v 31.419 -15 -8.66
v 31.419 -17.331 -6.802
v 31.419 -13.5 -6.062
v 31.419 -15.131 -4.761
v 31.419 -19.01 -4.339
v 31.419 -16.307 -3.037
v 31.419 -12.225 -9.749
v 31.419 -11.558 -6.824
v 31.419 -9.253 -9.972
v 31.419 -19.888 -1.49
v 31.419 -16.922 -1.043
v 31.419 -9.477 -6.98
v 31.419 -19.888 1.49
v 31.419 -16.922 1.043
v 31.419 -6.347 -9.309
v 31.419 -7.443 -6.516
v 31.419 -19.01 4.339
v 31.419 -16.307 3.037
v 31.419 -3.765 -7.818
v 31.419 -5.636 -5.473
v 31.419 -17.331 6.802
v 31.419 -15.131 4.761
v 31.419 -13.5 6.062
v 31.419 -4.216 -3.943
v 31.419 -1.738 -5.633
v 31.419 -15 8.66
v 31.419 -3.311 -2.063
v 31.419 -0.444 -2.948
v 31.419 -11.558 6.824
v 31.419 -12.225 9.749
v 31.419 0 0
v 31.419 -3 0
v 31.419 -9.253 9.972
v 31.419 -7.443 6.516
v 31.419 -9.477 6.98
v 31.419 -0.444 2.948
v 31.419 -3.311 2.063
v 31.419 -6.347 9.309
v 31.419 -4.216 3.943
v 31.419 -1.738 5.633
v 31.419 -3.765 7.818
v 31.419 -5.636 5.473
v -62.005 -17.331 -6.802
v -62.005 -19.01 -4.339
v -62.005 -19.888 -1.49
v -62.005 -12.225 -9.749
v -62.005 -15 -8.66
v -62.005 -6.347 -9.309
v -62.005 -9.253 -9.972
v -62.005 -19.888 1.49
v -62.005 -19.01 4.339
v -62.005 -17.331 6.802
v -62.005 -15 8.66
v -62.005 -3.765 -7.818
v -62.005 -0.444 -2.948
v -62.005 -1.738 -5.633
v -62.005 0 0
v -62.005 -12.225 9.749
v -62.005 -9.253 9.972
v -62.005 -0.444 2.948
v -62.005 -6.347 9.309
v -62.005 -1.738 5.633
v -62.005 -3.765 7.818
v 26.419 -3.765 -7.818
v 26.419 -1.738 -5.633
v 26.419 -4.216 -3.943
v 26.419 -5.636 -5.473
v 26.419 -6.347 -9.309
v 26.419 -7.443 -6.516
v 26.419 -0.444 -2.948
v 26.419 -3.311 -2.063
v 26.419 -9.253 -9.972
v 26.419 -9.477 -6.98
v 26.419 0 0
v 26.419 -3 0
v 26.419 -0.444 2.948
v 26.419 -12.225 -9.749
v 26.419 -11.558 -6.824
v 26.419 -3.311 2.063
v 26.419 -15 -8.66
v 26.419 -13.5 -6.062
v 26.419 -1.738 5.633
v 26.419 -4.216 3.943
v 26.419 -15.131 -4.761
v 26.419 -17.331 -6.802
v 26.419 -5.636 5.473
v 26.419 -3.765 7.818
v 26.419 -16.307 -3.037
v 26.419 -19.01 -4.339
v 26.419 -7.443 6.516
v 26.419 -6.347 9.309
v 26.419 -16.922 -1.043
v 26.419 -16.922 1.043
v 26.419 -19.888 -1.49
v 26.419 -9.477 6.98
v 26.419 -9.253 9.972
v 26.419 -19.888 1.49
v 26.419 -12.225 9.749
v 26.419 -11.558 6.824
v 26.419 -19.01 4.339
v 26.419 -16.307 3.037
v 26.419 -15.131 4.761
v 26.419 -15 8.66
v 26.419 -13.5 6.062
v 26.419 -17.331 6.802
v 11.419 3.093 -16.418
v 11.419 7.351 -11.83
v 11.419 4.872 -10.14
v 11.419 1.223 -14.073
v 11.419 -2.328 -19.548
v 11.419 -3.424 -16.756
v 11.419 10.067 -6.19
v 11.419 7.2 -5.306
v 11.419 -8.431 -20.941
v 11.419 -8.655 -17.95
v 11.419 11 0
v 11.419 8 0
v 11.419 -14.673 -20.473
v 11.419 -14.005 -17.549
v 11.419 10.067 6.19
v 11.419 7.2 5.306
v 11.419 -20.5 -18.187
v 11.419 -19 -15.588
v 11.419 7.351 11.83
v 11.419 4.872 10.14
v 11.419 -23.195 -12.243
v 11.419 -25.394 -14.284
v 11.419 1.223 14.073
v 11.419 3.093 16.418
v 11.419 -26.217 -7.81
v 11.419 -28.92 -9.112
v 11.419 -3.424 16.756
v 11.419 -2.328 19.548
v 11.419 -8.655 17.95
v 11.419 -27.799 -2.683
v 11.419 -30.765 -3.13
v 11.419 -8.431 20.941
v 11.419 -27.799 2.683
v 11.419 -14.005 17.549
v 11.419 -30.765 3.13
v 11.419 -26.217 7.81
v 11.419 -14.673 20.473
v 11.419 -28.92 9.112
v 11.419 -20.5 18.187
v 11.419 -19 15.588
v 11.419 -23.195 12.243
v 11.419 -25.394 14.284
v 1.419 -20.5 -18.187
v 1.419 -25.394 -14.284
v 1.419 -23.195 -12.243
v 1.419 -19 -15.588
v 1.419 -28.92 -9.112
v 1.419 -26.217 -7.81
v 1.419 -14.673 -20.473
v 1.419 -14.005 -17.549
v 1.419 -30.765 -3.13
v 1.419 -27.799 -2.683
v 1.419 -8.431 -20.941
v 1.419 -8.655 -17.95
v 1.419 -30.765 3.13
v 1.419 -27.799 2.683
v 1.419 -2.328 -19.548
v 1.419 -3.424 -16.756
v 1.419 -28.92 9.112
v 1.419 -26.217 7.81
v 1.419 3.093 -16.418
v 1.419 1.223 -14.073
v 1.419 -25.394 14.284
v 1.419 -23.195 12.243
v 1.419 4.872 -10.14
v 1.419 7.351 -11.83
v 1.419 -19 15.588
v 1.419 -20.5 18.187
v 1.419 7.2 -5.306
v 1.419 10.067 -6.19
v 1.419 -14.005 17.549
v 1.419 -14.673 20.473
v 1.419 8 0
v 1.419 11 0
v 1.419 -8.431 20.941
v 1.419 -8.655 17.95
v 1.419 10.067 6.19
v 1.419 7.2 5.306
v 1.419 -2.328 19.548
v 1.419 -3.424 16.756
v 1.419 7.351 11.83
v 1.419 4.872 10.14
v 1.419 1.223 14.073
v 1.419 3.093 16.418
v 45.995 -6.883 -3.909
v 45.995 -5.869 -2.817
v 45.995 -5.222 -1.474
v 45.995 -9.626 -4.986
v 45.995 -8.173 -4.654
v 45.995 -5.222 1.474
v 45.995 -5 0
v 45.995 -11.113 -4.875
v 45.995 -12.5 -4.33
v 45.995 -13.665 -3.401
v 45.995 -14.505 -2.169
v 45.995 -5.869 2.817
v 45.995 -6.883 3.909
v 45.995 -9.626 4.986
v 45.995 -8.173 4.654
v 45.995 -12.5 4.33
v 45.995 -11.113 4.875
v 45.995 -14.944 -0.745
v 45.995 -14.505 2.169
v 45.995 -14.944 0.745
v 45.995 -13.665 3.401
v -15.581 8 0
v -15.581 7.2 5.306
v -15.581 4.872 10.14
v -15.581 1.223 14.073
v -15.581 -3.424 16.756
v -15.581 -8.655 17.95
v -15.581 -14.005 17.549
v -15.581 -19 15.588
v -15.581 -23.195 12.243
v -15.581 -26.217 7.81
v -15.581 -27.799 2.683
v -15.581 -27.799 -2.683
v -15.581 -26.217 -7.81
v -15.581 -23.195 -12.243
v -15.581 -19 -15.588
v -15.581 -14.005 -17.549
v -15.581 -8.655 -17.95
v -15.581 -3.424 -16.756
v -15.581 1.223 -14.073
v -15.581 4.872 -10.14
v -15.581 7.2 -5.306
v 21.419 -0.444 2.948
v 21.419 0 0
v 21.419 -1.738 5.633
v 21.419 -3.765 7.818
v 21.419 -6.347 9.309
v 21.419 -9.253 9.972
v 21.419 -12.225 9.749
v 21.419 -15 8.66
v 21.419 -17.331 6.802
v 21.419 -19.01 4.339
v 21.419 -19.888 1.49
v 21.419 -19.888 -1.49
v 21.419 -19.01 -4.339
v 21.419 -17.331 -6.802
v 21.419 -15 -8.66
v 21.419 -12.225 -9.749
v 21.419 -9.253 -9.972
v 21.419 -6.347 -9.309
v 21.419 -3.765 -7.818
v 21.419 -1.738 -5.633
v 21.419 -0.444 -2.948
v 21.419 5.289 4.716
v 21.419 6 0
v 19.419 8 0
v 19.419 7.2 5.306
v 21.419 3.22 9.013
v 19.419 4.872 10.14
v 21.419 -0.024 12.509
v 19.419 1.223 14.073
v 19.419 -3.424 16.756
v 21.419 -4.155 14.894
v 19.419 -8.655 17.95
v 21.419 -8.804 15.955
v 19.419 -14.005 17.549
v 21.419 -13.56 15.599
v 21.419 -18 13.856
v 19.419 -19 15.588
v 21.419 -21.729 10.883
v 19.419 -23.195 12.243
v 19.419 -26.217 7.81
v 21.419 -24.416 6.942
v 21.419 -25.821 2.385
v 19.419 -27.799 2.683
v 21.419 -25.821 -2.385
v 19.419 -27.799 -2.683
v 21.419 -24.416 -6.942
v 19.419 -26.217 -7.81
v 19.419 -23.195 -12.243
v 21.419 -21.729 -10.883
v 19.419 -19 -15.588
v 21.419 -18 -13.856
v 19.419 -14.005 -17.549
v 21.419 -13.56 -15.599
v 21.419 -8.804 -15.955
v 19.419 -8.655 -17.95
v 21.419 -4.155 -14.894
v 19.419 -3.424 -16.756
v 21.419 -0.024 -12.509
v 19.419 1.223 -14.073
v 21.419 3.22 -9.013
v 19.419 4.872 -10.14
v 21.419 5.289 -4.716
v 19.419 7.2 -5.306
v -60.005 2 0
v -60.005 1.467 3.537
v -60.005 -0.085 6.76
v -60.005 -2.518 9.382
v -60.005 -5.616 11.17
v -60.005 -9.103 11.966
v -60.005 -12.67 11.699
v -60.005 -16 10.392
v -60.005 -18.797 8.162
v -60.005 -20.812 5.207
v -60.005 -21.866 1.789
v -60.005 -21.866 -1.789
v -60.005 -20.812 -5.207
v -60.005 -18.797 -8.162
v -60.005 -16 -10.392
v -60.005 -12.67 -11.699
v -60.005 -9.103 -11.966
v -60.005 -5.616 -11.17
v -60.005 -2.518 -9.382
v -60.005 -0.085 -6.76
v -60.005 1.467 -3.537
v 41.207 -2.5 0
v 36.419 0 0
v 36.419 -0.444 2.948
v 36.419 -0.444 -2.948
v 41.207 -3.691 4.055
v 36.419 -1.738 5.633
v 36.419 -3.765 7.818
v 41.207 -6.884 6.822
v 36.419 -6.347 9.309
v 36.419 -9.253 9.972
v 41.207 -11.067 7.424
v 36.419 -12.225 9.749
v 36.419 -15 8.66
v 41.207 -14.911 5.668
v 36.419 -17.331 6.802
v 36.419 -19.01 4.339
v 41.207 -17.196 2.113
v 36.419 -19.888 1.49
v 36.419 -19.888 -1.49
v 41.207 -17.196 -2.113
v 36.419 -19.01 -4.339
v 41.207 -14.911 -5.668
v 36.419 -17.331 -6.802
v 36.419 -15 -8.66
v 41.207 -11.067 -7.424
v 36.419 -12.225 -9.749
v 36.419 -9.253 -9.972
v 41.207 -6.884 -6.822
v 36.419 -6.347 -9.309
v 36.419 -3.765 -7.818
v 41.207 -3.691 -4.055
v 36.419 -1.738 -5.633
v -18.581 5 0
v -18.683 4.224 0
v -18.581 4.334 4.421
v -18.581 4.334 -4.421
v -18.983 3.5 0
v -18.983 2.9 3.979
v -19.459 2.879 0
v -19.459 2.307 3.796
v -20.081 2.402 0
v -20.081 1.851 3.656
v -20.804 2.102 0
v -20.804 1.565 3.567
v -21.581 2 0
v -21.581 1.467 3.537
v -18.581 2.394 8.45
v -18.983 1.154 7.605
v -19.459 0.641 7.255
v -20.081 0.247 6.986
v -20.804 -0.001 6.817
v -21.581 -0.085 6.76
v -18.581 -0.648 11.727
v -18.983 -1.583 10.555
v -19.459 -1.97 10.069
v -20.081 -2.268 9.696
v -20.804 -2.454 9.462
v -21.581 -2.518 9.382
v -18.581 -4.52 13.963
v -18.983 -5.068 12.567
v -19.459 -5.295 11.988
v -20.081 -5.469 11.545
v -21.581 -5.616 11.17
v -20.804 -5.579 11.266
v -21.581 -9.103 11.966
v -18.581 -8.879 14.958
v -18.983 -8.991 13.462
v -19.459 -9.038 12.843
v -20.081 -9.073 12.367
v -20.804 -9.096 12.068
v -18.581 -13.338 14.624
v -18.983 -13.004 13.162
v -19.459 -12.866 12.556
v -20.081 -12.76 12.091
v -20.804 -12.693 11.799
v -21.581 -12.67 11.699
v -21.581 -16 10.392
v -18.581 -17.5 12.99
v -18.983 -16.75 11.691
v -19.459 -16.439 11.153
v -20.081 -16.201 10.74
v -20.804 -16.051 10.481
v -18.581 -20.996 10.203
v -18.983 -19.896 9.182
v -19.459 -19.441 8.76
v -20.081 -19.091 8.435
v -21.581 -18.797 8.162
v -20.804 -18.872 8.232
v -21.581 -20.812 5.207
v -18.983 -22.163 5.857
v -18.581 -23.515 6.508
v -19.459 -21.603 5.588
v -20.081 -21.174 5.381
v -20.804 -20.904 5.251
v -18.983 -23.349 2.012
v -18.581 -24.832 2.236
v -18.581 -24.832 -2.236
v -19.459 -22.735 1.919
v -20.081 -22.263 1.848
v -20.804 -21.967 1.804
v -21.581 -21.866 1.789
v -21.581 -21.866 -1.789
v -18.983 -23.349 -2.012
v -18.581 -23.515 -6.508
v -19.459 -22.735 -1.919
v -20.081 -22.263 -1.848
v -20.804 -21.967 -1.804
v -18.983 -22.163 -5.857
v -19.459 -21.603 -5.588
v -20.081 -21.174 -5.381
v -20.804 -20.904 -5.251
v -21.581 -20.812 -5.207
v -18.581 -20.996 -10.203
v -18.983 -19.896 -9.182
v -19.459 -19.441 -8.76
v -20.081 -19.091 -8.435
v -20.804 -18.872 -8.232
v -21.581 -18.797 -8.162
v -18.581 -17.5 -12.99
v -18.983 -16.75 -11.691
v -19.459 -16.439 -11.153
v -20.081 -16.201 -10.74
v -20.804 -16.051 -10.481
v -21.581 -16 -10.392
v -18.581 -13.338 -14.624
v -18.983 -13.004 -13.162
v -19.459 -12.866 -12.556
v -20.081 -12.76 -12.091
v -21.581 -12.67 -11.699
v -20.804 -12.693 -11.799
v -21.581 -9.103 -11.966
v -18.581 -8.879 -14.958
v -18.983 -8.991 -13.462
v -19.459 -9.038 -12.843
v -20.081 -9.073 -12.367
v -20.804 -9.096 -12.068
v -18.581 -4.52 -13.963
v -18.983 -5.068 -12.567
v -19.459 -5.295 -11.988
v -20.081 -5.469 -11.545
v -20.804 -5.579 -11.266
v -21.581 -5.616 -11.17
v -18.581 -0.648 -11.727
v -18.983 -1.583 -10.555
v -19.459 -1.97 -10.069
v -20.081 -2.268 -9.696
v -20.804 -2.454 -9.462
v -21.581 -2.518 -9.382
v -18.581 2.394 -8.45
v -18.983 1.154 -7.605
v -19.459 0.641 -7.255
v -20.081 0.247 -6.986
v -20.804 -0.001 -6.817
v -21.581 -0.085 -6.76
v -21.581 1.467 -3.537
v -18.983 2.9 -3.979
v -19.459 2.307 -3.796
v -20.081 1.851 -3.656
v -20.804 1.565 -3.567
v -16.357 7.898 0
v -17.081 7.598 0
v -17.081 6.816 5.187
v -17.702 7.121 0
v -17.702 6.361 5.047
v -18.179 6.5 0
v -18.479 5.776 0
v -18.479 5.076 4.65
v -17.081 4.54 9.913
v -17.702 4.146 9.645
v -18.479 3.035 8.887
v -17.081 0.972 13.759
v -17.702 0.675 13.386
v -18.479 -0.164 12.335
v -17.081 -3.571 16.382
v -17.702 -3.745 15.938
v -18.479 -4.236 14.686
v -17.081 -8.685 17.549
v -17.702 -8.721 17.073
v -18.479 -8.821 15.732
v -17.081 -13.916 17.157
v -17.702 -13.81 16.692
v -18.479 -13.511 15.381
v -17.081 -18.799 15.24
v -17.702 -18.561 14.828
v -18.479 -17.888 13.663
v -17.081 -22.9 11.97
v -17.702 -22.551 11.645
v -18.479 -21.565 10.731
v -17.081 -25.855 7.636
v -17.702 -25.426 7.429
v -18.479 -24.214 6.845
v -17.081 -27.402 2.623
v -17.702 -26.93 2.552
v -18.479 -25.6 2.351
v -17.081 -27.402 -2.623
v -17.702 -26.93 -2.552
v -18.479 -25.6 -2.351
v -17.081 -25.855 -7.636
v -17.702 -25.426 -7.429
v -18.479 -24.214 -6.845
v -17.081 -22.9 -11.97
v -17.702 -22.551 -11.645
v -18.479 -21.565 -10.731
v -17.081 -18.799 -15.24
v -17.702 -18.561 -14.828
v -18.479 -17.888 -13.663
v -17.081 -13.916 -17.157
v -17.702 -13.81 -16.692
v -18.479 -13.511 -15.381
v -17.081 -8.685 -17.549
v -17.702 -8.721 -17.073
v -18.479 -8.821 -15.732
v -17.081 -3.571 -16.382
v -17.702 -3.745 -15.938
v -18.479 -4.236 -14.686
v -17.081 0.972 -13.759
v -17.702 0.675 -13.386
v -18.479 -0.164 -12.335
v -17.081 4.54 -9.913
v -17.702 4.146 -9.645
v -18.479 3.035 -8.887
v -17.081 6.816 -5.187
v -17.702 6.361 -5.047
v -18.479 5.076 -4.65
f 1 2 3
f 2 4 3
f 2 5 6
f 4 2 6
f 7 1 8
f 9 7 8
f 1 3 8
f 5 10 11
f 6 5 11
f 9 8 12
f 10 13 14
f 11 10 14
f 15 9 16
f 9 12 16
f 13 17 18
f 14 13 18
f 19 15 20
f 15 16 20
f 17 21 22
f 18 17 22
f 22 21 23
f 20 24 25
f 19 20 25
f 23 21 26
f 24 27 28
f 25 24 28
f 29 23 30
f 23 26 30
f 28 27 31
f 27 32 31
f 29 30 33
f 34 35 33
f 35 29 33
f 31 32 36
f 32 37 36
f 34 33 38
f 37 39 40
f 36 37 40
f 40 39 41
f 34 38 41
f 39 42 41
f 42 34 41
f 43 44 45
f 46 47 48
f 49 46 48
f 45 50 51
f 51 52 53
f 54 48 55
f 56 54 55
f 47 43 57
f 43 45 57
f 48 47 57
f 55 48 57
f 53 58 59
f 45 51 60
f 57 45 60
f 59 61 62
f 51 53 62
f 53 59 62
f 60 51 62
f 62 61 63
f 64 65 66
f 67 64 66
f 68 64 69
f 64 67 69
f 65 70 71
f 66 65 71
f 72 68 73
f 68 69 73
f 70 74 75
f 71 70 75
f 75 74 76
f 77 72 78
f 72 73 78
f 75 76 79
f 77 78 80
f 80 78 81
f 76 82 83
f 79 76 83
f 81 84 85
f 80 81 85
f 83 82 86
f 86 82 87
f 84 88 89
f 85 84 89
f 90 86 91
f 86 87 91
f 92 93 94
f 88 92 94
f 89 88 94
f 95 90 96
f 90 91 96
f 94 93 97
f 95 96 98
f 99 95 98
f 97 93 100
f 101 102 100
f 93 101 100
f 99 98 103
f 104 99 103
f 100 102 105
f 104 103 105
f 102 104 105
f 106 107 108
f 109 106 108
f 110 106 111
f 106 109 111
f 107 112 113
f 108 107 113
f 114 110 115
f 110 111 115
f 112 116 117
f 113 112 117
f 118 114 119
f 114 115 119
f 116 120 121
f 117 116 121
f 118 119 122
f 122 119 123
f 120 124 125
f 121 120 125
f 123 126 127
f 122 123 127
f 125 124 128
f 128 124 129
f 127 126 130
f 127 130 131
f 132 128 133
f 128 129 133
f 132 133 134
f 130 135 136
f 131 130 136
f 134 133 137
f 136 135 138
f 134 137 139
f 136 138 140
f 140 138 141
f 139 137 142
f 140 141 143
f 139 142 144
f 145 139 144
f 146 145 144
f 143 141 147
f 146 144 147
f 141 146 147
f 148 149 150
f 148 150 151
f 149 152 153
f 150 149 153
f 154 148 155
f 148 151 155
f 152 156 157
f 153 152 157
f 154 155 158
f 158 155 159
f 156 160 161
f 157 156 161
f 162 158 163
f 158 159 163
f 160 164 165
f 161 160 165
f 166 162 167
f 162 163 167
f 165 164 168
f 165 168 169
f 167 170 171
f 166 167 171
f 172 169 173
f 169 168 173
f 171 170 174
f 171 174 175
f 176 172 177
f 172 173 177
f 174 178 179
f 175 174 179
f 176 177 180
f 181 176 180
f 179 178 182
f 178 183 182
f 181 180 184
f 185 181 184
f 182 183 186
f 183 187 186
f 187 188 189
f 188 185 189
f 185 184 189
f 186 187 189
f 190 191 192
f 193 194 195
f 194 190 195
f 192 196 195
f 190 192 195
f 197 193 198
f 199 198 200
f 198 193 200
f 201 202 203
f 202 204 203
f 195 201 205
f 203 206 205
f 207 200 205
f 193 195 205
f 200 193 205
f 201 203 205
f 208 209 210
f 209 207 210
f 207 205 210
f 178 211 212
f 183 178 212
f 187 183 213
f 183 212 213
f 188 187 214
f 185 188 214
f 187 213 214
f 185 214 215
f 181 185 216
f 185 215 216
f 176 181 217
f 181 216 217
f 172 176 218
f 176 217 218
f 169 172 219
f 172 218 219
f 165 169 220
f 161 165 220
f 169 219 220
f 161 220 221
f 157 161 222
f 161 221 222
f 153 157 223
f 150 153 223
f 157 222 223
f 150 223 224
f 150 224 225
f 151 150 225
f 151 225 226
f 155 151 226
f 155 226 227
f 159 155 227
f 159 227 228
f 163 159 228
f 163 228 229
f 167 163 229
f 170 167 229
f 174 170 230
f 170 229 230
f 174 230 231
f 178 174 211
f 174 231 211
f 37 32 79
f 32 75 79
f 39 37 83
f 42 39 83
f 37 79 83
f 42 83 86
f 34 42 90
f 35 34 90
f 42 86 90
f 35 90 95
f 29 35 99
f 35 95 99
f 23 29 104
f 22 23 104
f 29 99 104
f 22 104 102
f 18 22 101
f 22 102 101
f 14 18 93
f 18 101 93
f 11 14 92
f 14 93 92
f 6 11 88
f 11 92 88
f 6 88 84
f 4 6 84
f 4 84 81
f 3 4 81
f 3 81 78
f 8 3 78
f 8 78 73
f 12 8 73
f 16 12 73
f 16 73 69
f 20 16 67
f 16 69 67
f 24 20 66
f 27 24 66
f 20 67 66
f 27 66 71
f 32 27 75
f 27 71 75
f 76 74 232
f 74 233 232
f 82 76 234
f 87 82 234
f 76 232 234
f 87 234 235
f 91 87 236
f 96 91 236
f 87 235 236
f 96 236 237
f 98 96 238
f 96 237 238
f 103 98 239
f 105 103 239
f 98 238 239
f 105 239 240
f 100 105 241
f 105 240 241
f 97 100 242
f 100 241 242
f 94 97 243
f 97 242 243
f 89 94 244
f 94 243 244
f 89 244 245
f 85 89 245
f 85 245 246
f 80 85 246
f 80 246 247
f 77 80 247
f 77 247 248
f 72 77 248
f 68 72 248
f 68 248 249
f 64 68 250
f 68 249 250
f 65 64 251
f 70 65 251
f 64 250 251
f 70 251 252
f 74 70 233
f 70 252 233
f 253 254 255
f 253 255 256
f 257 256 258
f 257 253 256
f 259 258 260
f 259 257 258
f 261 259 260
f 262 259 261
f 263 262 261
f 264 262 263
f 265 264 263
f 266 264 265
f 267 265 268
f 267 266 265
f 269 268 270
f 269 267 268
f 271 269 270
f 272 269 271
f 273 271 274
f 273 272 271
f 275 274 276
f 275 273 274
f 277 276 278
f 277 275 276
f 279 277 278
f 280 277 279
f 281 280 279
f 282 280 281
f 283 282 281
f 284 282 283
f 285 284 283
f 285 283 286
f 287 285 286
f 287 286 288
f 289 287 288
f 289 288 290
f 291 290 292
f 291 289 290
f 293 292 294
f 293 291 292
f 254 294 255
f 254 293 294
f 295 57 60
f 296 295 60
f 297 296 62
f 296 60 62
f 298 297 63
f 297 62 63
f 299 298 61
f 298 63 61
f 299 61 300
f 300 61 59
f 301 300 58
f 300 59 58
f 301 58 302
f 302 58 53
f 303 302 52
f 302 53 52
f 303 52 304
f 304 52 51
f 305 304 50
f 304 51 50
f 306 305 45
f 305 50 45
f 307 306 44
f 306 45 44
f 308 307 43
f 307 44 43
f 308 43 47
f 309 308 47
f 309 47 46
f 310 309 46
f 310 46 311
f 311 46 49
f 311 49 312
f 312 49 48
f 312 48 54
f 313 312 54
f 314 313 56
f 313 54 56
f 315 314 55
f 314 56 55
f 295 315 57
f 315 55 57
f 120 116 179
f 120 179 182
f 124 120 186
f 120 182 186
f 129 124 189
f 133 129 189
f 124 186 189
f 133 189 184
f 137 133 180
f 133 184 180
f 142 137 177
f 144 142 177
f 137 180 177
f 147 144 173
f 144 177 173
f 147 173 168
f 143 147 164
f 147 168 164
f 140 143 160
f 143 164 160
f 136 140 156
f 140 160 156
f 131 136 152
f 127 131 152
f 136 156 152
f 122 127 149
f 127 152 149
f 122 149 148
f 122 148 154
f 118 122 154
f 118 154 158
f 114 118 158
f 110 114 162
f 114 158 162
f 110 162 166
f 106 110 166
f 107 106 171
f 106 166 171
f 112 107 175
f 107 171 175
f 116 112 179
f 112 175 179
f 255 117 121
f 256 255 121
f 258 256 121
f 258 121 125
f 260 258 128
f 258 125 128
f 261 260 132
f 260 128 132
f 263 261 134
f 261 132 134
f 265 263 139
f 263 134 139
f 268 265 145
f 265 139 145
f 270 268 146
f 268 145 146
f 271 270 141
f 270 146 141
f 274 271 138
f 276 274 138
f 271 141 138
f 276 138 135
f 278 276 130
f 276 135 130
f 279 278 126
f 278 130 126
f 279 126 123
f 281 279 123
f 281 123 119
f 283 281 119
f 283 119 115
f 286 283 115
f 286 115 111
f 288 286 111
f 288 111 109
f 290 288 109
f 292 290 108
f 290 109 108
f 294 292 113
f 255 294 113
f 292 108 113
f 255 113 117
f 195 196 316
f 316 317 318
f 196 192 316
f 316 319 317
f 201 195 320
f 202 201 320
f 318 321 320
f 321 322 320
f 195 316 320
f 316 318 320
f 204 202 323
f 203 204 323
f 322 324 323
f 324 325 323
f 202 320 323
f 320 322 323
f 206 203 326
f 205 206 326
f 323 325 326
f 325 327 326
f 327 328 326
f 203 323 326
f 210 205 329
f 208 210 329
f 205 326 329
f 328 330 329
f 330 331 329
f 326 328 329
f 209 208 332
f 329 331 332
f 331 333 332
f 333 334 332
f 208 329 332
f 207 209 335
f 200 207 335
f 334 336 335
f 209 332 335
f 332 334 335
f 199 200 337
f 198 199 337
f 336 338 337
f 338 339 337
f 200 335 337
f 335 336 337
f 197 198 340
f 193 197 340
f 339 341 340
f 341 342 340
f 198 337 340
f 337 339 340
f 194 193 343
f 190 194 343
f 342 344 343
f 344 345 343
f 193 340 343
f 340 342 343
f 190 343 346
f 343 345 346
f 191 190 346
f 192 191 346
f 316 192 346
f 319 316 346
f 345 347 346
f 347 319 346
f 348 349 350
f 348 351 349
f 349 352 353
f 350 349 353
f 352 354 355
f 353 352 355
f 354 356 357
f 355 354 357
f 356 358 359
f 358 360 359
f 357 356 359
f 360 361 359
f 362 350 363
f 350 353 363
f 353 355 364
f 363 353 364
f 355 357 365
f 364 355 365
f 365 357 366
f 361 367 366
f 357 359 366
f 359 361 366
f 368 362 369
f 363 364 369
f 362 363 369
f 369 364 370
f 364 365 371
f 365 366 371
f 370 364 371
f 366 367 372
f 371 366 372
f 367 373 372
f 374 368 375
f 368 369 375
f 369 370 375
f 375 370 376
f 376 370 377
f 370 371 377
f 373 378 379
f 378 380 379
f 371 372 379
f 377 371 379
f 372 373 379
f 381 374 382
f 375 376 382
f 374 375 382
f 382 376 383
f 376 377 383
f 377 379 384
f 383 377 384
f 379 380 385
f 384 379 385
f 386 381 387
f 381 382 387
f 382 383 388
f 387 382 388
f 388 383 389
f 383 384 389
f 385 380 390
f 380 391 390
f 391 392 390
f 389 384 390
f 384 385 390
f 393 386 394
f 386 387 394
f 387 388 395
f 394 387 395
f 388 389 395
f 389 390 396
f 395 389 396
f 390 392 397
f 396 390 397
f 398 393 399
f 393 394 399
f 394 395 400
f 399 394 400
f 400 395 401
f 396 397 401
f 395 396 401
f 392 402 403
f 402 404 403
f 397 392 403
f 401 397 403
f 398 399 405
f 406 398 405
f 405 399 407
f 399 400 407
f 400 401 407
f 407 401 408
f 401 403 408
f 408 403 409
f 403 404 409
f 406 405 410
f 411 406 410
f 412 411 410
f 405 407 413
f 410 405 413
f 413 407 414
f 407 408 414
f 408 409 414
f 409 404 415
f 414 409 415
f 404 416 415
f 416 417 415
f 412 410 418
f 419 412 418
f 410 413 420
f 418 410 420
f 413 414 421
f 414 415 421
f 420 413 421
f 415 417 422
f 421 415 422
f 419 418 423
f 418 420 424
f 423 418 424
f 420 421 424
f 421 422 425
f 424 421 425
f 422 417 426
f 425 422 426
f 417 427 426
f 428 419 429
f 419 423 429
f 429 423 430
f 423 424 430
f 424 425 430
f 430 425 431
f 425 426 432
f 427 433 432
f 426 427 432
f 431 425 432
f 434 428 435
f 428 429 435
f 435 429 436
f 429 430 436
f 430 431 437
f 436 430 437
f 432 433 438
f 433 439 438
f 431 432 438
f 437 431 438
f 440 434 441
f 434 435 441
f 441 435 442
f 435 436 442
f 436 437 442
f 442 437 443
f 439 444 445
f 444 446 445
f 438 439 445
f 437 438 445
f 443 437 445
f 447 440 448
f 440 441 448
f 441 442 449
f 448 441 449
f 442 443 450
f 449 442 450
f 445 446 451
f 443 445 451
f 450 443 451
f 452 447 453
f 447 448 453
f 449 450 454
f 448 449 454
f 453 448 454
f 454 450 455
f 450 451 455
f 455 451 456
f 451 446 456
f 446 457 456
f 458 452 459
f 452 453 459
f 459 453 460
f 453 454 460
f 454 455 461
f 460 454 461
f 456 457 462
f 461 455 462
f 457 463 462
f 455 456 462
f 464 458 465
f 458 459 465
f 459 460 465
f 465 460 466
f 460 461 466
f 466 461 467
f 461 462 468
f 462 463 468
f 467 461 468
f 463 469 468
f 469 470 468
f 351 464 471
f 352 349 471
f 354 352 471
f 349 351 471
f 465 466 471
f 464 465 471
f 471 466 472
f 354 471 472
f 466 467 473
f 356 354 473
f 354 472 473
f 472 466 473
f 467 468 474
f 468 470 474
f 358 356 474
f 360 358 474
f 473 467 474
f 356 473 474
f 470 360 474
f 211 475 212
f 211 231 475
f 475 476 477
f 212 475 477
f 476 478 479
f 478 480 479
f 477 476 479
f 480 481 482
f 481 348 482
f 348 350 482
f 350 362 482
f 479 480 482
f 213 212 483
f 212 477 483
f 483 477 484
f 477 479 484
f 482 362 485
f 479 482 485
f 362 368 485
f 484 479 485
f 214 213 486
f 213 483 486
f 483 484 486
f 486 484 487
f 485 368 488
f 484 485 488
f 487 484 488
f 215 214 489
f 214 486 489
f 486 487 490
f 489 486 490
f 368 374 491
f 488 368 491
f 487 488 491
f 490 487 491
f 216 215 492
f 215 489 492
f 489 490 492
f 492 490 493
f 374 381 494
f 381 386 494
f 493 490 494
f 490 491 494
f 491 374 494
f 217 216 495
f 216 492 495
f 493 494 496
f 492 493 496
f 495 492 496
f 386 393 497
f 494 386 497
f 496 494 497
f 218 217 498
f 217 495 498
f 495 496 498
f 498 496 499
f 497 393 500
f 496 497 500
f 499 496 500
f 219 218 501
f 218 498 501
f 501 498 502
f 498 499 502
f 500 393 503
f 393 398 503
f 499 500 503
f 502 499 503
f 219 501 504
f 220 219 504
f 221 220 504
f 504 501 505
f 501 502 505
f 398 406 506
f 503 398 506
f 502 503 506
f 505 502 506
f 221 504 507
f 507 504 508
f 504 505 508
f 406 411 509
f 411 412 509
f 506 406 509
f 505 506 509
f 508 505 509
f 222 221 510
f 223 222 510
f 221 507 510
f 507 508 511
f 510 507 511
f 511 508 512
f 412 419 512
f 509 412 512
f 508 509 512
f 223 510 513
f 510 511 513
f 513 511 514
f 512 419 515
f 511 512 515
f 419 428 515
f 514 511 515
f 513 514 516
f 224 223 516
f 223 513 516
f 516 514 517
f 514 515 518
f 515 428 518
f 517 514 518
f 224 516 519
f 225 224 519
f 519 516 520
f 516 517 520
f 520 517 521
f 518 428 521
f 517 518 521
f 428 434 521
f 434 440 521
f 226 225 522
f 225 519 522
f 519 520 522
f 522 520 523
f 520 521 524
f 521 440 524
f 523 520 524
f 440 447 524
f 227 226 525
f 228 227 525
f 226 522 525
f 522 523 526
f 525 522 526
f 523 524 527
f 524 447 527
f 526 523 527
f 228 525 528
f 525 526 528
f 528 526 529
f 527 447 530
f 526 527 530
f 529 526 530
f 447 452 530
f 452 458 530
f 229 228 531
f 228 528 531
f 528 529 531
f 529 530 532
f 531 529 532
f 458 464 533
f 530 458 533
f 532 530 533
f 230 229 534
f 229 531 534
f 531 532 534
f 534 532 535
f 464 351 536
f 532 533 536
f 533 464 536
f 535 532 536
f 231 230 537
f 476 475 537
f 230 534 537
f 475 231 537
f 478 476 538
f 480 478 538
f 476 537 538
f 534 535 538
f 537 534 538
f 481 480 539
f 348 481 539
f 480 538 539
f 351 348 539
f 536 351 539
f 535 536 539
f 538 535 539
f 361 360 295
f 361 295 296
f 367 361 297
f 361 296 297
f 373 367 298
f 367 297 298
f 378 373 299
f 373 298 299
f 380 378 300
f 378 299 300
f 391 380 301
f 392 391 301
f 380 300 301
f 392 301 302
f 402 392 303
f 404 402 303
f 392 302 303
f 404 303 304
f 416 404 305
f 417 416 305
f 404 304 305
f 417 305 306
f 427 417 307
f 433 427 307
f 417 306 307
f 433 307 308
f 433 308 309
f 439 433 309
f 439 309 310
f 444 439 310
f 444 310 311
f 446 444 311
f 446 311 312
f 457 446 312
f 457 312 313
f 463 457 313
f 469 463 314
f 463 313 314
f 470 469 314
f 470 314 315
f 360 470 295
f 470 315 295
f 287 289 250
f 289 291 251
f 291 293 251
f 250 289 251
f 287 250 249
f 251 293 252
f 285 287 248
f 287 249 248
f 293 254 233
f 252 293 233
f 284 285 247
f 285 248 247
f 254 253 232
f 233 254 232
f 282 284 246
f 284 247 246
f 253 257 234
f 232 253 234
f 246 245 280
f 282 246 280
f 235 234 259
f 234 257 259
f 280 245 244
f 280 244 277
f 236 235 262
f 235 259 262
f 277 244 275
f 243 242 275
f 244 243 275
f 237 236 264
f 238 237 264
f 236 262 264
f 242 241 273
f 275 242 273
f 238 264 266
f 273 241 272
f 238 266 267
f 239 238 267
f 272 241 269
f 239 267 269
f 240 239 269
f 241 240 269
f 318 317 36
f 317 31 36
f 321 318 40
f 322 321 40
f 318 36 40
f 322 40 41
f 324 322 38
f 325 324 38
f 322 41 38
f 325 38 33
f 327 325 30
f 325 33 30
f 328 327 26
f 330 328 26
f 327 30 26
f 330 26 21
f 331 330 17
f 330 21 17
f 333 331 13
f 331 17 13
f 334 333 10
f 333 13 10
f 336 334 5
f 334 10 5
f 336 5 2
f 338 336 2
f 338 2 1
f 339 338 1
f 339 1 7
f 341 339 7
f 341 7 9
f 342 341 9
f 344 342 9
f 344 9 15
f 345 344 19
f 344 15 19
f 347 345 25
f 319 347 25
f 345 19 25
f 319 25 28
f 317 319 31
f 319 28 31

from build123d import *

# Parameters (mm, degrees)
F2_R    = 2.99999
F3_SIZE = 2


# Not quite as in the source:
# - a fillet or chamfer is up to 0.001 mm smaller than in the source, because OpenCascade refuses the exact size


with BuildPart() as f1:
    # F0 (on Top) → F1 (revolve)
    with BuildSketch(Plane.XY):
        Polygon((-62.0045285772, 2), (-62.0045285772, -10), (45.9954714228, -10), (45.9954714228, -5), (36.4192584626, 0), (31.4192584626, 0), (31.4192584626, -3), (26.4192584626, -3), (26.4192584626, 0), (21.4192584626, 0), (21.4192584626, 8), (11.4192584626, 8), (11.4192584626, 11), (1.4192584626, 11), (1.4192584626, 8), (-18.5807415374, 8), (-18.5807415374, 2), align=None)
    revolve(axis=Axis((-8.0045285772, -10, 0), (1, 0, 0)))

    # F2 (radius 3 in the source; OpenCascade refuses exactly that, so slightly less here)
    f2_edges = [f1.edges().sort_by_distance(p)[0] for p in [
        (-18.580742, -28, 0),
        (-18.580742, -22, 0),
    ]]
    fillet(f2_edges, radius=F2_R)

    # F3
    f3_edges = [f1.edges().sort_by_distance(p)[0] for p in [
        (21.419258, -28, 0),
        (-62.004529, -22, 0),
    ]]
    chamfer(f3_edges, length=F3_SIZE)


solid = f1.part
